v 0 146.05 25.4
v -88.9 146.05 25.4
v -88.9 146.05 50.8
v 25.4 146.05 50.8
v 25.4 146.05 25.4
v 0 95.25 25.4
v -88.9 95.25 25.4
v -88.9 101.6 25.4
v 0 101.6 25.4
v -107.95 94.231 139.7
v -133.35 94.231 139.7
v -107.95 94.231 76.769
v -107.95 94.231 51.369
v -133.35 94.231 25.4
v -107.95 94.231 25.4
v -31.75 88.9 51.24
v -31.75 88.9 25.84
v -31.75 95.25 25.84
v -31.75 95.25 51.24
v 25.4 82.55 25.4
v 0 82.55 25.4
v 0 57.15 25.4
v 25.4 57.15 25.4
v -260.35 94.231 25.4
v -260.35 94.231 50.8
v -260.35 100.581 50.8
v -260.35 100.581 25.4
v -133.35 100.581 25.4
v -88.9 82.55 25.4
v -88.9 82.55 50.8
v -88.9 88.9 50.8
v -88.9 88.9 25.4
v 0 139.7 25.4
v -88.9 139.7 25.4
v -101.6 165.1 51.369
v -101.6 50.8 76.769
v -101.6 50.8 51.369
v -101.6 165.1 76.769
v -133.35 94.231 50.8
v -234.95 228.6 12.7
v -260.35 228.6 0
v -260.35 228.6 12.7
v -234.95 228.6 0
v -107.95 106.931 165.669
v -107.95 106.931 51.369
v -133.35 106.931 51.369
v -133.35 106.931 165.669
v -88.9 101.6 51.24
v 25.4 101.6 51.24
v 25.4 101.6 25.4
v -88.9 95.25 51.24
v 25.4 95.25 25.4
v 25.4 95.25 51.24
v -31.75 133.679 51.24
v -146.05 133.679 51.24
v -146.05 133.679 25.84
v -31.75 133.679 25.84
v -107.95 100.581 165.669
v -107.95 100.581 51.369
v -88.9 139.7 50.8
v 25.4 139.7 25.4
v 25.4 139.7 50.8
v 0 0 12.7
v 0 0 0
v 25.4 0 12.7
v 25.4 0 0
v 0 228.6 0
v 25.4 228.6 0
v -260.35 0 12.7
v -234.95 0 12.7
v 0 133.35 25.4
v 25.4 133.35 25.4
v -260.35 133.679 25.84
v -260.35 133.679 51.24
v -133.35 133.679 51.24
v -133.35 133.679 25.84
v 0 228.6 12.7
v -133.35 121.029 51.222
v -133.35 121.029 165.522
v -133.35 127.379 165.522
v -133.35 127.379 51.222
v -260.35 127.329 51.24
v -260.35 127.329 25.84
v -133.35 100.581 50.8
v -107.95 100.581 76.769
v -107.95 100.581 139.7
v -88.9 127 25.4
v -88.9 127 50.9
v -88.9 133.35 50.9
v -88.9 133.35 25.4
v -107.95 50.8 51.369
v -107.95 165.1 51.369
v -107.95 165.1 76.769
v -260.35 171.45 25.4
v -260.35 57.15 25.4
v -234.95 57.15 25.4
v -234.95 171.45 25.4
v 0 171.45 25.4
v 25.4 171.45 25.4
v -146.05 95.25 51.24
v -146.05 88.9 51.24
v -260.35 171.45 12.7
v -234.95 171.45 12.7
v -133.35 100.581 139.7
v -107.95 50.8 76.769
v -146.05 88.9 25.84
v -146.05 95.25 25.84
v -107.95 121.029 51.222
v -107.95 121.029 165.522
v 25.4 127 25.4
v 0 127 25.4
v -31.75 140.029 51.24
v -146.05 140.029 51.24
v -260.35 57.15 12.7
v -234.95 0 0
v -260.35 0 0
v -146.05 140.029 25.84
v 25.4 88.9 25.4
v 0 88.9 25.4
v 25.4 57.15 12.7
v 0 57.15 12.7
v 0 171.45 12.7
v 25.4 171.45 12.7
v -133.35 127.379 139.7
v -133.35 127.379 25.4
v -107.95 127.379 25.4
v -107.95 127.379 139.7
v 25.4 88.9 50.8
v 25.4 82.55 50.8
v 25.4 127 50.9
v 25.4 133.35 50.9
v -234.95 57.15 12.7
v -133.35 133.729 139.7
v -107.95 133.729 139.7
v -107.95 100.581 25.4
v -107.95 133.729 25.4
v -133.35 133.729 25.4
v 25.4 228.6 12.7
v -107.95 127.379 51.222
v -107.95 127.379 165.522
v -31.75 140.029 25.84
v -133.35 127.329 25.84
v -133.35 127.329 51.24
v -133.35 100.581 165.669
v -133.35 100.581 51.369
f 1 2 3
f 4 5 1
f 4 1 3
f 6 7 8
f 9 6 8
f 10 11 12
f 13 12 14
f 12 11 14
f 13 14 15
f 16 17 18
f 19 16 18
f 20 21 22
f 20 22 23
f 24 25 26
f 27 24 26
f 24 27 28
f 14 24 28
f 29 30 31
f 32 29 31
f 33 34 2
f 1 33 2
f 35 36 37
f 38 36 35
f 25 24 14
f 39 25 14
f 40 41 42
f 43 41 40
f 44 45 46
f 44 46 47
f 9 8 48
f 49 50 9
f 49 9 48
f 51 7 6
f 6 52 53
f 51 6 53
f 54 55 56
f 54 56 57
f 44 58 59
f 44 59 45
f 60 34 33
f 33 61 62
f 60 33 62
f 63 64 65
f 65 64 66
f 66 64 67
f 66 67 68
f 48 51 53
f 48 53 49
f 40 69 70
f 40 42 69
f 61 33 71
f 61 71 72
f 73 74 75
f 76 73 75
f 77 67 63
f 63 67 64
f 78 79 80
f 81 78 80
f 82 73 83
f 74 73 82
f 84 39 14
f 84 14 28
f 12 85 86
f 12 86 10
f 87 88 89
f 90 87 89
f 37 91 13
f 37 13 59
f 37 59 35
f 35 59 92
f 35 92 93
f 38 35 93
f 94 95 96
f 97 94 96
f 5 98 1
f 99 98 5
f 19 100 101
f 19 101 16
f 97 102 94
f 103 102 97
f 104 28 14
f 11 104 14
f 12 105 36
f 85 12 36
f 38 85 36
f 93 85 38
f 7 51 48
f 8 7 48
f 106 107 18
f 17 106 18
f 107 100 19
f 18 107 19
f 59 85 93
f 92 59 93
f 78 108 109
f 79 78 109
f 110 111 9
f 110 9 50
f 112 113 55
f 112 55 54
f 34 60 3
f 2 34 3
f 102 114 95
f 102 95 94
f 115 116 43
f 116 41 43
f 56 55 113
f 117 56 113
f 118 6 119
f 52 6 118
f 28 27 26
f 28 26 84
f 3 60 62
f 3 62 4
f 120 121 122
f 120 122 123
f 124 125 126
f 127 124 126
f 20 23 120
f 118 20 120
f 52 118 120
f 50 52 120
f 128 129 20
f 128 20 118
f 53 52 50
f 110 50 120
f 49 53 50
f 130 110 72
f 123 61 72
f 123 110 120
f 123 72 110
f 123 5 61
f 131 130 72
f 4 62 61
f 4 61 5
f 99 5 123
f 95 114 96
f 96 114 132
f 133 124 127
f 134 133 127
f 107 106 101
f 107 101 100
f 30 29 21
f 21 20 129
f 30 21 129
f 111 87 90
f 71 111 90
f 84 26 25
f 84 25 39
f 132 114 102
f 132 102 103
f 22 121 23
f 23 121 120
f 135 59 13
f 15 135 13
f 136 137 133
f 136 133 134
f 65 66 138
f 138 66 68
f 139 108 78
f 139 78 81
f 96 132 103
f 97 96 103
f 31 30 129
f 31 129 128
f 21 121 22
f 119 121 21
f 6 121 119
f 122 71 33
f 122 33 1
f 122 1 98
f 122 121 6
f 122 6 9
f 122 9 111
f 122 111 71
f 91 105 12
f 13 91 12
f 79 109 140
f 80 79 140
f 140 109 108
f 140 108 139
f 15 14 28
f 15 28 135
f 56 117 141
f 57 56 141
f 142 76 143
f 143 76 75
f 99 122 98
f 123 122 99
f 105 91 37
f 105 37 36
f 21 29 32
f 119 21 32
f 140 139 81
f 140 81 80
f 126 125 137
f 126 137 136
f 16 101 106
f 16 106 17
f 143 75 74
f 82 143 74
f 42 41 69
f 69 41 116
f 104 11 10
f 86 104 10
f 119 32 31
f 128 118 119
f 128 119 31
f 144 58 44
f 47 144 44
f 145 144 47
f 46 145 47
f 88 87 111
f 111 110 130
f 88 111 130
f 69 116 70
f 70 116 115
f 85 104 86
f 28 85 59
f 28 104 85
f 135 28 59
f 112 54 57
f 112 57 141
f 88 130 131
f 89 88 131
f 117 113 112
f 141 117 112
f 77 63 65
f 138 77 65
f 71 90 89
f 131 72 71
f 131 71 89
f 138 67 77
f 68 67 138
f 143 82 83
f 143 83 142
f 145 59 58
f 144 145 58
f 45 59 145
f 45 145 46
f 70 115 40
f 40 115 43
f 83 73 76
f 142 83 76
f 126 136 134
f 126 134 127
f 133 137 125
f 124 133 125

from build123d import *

# Parameters (mm, degrees)
F0_W      = 25.4
F0_H      = 114.3
F1_DEPTH  = 12.7
F2_W      = 25.4
F2_H      = 114.3
F3_DEPTH  = 12.7
F4_W      = 6.35
F4_H      = 25.4
F4_H_2    = 25.8404441833
F4_H_3    = 25.4999750018
F5_DEPTH  = 114.3
F6_W      = 114.3
F6_H      = 6.35
F7_DEPTH  = 25.4
F8_W      = 12.7
F8_H      = 25.4
F8_W_2    = 114.3
F9_DEPTH  = 6.35
F10_W     = 127
F10_H     = 6.35
F11_DEPTH = 25.4
F12_W     = 25.4
F12_H     = 6.35
F13_DEPTH = 114.3
F14_W     = 6.35
F14_H     = 114.3
F15_DEPTH = 25.4
F16_W     = 6.35
F16_H     = 114.3
F17_DEPTH = 25.4
F18_W     = 114.3
F18_H     = 25.4
F19_DEPTH = 6.35


with BuildPart() as f1:
    # F0 (on Top) → F1 (new body)
    with BuildSketch(Plane.XY):
        with Locations((12.7, 57.15)):
            Rectangle(F0_W, F0_H)
        with Locations((12.7, 171.45)):
            Rectangle(F0_W, F0_H)
    extrude(amount=F1_DEPTH)


with BuildPart() as f1b:
    # F0 (on Top) → F1, piece 2 (new body)
    with BuildSketch(Plane.XY):
        with Locations((-247.65, 57.15)):
            Rectangle(F0_W, F0_H)
        with Locations((-247.65, 171.45)):
            Rectangle(F0_W, F0_H)
    extrude(amount=F1_DEPTH)


with BuildPart() as f3:
    # F2 (on face) → F3 (new body)
    with BuildSketch(Plane.XY.offset(12.7)):
        with Locations((-247.65, 114.3)):
            Rectangle(F2_W, F2_H)
    extrude(amount=F3_DEPTH)


with BuildPart() as f3b:
    # F2 (on face) → F3, piece 2 (new body)
    with BuildSketch(Plane.XY.offset(12.7)):
        with Locations((12.7, 114.3)):
            Rectangle(F2_W, F2_H)
    extrude(amount=F3_DEPTH)

    # F4 (on face) → F5 (join)
    with BuildSketch(Plane.YZ.offset(25.4)):
        with Locations((85.725, 38.1)):
            Rectangle(F4_W, F4_H)
        with Locations((142.875, 38.1)):
            Rectangle(F4_W, F4_H)
        with Locations((98.425, 38.3202220917)):
            Rectangle(F4_W, F4_H_2)
        with Locations((130.175, 38.1499875009)):
            Rectangle(F4_W, F4_H_3)
    extrude(amount=-F5_DEPTH)


with BuildPart() as f7:
    # F6 (on face) → F7 (new body)
    with BuildSketch(Plane.XY.offset(51.2404441833)):
        with Locations((-88.9, 92.075)):
            Rectangle(F6_W, F6_H)
    extrude(amount=-F7_DEPTH)


with BuildPart() as f7b:
    # F6 (on face) → F7, piece 2 (new body)
    with BuildSketch(Plane.XY.offset(51.2404441833)):
        with Locations((-88.9, 136.8542856455)):
            Rectangle(F6_W, F6_H)
    extrude(amount=-F7_DEPTH)


with BuildPart() as f9:
    # F8 (on face) → F9 (new body)
    with BuildSketch(Plane.XZ.offset(-133.6792856455)):
        with Locations((-139.7, 38.5404441833)):
            Rectangle(F8_W, F8_H)
        with Locations((-203.2, 38.5404441833)):
            Rectangle(F8_W_2, F8_H)
    extrude(amount=F9_DEPTH)


with BuildPart() as f11:
    # F10 (on face) → F11 (new body)
    with BuildSketch(Plane.XY.offset(25.4)):
        with Locations((-196.85, 97.4058008671)):
            Rectangle(F10_W, F10_H)
    extrude(amount=F11_DEPTH)


with BuildPart() as f13:
    # F12 (on face) → F13 (new body)
    with BuildSketch(Plane(origin=(0, 0, 25.4), x_dir=(1, 0, 0), z_dir=(0, 0, -1))):
        with Locations((-120.65, -97.4058008671)):
            Rectangle(F12_W, F12_H)
    extrude(amount=-F13_DEPTH)

    # F18 (on face) → F19 (join)
    with BuildSketch(Plane.YZ.offset(-107.95)):
        with Locations((107.95, 64.0690114021)):
            Rectangle(F18_W, F18_H)
    extrude(amount=F19_DEPTH)


with BuildPart() as f13b:
    # F12 (on face) → F13, piece 2 (new body)
    with BuildSketch(Plane(origin=(0, 0, 25.4), x_dir=(1, 0, 0), z_dir=(0, 0, -1))):
        with Locations((-120.65, -130.5542939425)):
            Rectangle(F12_W, F12_H)
    extrude(amount=-F13_DEPTH)


with BuildPart() as f15:
    # F14 (on face) → F15 (new body)
    with BuildSketch(Plane.YZ.offset(-107.95)):
        with Locations((124.2042939425, 108.3719928205)):
            Rectangle(F14_W, F14_H)
    extrude(amount=-F15_DEPTH)


with BuildPart() as f17:
    # F16 (on face) → F17 (new body)
    with BuildSketch(Plane.YZ.offset(-107.95)):
        with Locations((103.7558008671, 108.5190114021)):
            Rectangle(F16_W, F16_H)
    extrude(amount=-F17_DEPTH)


solid = Compound([f1.part, f1b.part, f3.part, f3b.part, f7.part, f7b.part, f9.part, f11.part, f13.part, f13b.part, f15.part, f17.part])
